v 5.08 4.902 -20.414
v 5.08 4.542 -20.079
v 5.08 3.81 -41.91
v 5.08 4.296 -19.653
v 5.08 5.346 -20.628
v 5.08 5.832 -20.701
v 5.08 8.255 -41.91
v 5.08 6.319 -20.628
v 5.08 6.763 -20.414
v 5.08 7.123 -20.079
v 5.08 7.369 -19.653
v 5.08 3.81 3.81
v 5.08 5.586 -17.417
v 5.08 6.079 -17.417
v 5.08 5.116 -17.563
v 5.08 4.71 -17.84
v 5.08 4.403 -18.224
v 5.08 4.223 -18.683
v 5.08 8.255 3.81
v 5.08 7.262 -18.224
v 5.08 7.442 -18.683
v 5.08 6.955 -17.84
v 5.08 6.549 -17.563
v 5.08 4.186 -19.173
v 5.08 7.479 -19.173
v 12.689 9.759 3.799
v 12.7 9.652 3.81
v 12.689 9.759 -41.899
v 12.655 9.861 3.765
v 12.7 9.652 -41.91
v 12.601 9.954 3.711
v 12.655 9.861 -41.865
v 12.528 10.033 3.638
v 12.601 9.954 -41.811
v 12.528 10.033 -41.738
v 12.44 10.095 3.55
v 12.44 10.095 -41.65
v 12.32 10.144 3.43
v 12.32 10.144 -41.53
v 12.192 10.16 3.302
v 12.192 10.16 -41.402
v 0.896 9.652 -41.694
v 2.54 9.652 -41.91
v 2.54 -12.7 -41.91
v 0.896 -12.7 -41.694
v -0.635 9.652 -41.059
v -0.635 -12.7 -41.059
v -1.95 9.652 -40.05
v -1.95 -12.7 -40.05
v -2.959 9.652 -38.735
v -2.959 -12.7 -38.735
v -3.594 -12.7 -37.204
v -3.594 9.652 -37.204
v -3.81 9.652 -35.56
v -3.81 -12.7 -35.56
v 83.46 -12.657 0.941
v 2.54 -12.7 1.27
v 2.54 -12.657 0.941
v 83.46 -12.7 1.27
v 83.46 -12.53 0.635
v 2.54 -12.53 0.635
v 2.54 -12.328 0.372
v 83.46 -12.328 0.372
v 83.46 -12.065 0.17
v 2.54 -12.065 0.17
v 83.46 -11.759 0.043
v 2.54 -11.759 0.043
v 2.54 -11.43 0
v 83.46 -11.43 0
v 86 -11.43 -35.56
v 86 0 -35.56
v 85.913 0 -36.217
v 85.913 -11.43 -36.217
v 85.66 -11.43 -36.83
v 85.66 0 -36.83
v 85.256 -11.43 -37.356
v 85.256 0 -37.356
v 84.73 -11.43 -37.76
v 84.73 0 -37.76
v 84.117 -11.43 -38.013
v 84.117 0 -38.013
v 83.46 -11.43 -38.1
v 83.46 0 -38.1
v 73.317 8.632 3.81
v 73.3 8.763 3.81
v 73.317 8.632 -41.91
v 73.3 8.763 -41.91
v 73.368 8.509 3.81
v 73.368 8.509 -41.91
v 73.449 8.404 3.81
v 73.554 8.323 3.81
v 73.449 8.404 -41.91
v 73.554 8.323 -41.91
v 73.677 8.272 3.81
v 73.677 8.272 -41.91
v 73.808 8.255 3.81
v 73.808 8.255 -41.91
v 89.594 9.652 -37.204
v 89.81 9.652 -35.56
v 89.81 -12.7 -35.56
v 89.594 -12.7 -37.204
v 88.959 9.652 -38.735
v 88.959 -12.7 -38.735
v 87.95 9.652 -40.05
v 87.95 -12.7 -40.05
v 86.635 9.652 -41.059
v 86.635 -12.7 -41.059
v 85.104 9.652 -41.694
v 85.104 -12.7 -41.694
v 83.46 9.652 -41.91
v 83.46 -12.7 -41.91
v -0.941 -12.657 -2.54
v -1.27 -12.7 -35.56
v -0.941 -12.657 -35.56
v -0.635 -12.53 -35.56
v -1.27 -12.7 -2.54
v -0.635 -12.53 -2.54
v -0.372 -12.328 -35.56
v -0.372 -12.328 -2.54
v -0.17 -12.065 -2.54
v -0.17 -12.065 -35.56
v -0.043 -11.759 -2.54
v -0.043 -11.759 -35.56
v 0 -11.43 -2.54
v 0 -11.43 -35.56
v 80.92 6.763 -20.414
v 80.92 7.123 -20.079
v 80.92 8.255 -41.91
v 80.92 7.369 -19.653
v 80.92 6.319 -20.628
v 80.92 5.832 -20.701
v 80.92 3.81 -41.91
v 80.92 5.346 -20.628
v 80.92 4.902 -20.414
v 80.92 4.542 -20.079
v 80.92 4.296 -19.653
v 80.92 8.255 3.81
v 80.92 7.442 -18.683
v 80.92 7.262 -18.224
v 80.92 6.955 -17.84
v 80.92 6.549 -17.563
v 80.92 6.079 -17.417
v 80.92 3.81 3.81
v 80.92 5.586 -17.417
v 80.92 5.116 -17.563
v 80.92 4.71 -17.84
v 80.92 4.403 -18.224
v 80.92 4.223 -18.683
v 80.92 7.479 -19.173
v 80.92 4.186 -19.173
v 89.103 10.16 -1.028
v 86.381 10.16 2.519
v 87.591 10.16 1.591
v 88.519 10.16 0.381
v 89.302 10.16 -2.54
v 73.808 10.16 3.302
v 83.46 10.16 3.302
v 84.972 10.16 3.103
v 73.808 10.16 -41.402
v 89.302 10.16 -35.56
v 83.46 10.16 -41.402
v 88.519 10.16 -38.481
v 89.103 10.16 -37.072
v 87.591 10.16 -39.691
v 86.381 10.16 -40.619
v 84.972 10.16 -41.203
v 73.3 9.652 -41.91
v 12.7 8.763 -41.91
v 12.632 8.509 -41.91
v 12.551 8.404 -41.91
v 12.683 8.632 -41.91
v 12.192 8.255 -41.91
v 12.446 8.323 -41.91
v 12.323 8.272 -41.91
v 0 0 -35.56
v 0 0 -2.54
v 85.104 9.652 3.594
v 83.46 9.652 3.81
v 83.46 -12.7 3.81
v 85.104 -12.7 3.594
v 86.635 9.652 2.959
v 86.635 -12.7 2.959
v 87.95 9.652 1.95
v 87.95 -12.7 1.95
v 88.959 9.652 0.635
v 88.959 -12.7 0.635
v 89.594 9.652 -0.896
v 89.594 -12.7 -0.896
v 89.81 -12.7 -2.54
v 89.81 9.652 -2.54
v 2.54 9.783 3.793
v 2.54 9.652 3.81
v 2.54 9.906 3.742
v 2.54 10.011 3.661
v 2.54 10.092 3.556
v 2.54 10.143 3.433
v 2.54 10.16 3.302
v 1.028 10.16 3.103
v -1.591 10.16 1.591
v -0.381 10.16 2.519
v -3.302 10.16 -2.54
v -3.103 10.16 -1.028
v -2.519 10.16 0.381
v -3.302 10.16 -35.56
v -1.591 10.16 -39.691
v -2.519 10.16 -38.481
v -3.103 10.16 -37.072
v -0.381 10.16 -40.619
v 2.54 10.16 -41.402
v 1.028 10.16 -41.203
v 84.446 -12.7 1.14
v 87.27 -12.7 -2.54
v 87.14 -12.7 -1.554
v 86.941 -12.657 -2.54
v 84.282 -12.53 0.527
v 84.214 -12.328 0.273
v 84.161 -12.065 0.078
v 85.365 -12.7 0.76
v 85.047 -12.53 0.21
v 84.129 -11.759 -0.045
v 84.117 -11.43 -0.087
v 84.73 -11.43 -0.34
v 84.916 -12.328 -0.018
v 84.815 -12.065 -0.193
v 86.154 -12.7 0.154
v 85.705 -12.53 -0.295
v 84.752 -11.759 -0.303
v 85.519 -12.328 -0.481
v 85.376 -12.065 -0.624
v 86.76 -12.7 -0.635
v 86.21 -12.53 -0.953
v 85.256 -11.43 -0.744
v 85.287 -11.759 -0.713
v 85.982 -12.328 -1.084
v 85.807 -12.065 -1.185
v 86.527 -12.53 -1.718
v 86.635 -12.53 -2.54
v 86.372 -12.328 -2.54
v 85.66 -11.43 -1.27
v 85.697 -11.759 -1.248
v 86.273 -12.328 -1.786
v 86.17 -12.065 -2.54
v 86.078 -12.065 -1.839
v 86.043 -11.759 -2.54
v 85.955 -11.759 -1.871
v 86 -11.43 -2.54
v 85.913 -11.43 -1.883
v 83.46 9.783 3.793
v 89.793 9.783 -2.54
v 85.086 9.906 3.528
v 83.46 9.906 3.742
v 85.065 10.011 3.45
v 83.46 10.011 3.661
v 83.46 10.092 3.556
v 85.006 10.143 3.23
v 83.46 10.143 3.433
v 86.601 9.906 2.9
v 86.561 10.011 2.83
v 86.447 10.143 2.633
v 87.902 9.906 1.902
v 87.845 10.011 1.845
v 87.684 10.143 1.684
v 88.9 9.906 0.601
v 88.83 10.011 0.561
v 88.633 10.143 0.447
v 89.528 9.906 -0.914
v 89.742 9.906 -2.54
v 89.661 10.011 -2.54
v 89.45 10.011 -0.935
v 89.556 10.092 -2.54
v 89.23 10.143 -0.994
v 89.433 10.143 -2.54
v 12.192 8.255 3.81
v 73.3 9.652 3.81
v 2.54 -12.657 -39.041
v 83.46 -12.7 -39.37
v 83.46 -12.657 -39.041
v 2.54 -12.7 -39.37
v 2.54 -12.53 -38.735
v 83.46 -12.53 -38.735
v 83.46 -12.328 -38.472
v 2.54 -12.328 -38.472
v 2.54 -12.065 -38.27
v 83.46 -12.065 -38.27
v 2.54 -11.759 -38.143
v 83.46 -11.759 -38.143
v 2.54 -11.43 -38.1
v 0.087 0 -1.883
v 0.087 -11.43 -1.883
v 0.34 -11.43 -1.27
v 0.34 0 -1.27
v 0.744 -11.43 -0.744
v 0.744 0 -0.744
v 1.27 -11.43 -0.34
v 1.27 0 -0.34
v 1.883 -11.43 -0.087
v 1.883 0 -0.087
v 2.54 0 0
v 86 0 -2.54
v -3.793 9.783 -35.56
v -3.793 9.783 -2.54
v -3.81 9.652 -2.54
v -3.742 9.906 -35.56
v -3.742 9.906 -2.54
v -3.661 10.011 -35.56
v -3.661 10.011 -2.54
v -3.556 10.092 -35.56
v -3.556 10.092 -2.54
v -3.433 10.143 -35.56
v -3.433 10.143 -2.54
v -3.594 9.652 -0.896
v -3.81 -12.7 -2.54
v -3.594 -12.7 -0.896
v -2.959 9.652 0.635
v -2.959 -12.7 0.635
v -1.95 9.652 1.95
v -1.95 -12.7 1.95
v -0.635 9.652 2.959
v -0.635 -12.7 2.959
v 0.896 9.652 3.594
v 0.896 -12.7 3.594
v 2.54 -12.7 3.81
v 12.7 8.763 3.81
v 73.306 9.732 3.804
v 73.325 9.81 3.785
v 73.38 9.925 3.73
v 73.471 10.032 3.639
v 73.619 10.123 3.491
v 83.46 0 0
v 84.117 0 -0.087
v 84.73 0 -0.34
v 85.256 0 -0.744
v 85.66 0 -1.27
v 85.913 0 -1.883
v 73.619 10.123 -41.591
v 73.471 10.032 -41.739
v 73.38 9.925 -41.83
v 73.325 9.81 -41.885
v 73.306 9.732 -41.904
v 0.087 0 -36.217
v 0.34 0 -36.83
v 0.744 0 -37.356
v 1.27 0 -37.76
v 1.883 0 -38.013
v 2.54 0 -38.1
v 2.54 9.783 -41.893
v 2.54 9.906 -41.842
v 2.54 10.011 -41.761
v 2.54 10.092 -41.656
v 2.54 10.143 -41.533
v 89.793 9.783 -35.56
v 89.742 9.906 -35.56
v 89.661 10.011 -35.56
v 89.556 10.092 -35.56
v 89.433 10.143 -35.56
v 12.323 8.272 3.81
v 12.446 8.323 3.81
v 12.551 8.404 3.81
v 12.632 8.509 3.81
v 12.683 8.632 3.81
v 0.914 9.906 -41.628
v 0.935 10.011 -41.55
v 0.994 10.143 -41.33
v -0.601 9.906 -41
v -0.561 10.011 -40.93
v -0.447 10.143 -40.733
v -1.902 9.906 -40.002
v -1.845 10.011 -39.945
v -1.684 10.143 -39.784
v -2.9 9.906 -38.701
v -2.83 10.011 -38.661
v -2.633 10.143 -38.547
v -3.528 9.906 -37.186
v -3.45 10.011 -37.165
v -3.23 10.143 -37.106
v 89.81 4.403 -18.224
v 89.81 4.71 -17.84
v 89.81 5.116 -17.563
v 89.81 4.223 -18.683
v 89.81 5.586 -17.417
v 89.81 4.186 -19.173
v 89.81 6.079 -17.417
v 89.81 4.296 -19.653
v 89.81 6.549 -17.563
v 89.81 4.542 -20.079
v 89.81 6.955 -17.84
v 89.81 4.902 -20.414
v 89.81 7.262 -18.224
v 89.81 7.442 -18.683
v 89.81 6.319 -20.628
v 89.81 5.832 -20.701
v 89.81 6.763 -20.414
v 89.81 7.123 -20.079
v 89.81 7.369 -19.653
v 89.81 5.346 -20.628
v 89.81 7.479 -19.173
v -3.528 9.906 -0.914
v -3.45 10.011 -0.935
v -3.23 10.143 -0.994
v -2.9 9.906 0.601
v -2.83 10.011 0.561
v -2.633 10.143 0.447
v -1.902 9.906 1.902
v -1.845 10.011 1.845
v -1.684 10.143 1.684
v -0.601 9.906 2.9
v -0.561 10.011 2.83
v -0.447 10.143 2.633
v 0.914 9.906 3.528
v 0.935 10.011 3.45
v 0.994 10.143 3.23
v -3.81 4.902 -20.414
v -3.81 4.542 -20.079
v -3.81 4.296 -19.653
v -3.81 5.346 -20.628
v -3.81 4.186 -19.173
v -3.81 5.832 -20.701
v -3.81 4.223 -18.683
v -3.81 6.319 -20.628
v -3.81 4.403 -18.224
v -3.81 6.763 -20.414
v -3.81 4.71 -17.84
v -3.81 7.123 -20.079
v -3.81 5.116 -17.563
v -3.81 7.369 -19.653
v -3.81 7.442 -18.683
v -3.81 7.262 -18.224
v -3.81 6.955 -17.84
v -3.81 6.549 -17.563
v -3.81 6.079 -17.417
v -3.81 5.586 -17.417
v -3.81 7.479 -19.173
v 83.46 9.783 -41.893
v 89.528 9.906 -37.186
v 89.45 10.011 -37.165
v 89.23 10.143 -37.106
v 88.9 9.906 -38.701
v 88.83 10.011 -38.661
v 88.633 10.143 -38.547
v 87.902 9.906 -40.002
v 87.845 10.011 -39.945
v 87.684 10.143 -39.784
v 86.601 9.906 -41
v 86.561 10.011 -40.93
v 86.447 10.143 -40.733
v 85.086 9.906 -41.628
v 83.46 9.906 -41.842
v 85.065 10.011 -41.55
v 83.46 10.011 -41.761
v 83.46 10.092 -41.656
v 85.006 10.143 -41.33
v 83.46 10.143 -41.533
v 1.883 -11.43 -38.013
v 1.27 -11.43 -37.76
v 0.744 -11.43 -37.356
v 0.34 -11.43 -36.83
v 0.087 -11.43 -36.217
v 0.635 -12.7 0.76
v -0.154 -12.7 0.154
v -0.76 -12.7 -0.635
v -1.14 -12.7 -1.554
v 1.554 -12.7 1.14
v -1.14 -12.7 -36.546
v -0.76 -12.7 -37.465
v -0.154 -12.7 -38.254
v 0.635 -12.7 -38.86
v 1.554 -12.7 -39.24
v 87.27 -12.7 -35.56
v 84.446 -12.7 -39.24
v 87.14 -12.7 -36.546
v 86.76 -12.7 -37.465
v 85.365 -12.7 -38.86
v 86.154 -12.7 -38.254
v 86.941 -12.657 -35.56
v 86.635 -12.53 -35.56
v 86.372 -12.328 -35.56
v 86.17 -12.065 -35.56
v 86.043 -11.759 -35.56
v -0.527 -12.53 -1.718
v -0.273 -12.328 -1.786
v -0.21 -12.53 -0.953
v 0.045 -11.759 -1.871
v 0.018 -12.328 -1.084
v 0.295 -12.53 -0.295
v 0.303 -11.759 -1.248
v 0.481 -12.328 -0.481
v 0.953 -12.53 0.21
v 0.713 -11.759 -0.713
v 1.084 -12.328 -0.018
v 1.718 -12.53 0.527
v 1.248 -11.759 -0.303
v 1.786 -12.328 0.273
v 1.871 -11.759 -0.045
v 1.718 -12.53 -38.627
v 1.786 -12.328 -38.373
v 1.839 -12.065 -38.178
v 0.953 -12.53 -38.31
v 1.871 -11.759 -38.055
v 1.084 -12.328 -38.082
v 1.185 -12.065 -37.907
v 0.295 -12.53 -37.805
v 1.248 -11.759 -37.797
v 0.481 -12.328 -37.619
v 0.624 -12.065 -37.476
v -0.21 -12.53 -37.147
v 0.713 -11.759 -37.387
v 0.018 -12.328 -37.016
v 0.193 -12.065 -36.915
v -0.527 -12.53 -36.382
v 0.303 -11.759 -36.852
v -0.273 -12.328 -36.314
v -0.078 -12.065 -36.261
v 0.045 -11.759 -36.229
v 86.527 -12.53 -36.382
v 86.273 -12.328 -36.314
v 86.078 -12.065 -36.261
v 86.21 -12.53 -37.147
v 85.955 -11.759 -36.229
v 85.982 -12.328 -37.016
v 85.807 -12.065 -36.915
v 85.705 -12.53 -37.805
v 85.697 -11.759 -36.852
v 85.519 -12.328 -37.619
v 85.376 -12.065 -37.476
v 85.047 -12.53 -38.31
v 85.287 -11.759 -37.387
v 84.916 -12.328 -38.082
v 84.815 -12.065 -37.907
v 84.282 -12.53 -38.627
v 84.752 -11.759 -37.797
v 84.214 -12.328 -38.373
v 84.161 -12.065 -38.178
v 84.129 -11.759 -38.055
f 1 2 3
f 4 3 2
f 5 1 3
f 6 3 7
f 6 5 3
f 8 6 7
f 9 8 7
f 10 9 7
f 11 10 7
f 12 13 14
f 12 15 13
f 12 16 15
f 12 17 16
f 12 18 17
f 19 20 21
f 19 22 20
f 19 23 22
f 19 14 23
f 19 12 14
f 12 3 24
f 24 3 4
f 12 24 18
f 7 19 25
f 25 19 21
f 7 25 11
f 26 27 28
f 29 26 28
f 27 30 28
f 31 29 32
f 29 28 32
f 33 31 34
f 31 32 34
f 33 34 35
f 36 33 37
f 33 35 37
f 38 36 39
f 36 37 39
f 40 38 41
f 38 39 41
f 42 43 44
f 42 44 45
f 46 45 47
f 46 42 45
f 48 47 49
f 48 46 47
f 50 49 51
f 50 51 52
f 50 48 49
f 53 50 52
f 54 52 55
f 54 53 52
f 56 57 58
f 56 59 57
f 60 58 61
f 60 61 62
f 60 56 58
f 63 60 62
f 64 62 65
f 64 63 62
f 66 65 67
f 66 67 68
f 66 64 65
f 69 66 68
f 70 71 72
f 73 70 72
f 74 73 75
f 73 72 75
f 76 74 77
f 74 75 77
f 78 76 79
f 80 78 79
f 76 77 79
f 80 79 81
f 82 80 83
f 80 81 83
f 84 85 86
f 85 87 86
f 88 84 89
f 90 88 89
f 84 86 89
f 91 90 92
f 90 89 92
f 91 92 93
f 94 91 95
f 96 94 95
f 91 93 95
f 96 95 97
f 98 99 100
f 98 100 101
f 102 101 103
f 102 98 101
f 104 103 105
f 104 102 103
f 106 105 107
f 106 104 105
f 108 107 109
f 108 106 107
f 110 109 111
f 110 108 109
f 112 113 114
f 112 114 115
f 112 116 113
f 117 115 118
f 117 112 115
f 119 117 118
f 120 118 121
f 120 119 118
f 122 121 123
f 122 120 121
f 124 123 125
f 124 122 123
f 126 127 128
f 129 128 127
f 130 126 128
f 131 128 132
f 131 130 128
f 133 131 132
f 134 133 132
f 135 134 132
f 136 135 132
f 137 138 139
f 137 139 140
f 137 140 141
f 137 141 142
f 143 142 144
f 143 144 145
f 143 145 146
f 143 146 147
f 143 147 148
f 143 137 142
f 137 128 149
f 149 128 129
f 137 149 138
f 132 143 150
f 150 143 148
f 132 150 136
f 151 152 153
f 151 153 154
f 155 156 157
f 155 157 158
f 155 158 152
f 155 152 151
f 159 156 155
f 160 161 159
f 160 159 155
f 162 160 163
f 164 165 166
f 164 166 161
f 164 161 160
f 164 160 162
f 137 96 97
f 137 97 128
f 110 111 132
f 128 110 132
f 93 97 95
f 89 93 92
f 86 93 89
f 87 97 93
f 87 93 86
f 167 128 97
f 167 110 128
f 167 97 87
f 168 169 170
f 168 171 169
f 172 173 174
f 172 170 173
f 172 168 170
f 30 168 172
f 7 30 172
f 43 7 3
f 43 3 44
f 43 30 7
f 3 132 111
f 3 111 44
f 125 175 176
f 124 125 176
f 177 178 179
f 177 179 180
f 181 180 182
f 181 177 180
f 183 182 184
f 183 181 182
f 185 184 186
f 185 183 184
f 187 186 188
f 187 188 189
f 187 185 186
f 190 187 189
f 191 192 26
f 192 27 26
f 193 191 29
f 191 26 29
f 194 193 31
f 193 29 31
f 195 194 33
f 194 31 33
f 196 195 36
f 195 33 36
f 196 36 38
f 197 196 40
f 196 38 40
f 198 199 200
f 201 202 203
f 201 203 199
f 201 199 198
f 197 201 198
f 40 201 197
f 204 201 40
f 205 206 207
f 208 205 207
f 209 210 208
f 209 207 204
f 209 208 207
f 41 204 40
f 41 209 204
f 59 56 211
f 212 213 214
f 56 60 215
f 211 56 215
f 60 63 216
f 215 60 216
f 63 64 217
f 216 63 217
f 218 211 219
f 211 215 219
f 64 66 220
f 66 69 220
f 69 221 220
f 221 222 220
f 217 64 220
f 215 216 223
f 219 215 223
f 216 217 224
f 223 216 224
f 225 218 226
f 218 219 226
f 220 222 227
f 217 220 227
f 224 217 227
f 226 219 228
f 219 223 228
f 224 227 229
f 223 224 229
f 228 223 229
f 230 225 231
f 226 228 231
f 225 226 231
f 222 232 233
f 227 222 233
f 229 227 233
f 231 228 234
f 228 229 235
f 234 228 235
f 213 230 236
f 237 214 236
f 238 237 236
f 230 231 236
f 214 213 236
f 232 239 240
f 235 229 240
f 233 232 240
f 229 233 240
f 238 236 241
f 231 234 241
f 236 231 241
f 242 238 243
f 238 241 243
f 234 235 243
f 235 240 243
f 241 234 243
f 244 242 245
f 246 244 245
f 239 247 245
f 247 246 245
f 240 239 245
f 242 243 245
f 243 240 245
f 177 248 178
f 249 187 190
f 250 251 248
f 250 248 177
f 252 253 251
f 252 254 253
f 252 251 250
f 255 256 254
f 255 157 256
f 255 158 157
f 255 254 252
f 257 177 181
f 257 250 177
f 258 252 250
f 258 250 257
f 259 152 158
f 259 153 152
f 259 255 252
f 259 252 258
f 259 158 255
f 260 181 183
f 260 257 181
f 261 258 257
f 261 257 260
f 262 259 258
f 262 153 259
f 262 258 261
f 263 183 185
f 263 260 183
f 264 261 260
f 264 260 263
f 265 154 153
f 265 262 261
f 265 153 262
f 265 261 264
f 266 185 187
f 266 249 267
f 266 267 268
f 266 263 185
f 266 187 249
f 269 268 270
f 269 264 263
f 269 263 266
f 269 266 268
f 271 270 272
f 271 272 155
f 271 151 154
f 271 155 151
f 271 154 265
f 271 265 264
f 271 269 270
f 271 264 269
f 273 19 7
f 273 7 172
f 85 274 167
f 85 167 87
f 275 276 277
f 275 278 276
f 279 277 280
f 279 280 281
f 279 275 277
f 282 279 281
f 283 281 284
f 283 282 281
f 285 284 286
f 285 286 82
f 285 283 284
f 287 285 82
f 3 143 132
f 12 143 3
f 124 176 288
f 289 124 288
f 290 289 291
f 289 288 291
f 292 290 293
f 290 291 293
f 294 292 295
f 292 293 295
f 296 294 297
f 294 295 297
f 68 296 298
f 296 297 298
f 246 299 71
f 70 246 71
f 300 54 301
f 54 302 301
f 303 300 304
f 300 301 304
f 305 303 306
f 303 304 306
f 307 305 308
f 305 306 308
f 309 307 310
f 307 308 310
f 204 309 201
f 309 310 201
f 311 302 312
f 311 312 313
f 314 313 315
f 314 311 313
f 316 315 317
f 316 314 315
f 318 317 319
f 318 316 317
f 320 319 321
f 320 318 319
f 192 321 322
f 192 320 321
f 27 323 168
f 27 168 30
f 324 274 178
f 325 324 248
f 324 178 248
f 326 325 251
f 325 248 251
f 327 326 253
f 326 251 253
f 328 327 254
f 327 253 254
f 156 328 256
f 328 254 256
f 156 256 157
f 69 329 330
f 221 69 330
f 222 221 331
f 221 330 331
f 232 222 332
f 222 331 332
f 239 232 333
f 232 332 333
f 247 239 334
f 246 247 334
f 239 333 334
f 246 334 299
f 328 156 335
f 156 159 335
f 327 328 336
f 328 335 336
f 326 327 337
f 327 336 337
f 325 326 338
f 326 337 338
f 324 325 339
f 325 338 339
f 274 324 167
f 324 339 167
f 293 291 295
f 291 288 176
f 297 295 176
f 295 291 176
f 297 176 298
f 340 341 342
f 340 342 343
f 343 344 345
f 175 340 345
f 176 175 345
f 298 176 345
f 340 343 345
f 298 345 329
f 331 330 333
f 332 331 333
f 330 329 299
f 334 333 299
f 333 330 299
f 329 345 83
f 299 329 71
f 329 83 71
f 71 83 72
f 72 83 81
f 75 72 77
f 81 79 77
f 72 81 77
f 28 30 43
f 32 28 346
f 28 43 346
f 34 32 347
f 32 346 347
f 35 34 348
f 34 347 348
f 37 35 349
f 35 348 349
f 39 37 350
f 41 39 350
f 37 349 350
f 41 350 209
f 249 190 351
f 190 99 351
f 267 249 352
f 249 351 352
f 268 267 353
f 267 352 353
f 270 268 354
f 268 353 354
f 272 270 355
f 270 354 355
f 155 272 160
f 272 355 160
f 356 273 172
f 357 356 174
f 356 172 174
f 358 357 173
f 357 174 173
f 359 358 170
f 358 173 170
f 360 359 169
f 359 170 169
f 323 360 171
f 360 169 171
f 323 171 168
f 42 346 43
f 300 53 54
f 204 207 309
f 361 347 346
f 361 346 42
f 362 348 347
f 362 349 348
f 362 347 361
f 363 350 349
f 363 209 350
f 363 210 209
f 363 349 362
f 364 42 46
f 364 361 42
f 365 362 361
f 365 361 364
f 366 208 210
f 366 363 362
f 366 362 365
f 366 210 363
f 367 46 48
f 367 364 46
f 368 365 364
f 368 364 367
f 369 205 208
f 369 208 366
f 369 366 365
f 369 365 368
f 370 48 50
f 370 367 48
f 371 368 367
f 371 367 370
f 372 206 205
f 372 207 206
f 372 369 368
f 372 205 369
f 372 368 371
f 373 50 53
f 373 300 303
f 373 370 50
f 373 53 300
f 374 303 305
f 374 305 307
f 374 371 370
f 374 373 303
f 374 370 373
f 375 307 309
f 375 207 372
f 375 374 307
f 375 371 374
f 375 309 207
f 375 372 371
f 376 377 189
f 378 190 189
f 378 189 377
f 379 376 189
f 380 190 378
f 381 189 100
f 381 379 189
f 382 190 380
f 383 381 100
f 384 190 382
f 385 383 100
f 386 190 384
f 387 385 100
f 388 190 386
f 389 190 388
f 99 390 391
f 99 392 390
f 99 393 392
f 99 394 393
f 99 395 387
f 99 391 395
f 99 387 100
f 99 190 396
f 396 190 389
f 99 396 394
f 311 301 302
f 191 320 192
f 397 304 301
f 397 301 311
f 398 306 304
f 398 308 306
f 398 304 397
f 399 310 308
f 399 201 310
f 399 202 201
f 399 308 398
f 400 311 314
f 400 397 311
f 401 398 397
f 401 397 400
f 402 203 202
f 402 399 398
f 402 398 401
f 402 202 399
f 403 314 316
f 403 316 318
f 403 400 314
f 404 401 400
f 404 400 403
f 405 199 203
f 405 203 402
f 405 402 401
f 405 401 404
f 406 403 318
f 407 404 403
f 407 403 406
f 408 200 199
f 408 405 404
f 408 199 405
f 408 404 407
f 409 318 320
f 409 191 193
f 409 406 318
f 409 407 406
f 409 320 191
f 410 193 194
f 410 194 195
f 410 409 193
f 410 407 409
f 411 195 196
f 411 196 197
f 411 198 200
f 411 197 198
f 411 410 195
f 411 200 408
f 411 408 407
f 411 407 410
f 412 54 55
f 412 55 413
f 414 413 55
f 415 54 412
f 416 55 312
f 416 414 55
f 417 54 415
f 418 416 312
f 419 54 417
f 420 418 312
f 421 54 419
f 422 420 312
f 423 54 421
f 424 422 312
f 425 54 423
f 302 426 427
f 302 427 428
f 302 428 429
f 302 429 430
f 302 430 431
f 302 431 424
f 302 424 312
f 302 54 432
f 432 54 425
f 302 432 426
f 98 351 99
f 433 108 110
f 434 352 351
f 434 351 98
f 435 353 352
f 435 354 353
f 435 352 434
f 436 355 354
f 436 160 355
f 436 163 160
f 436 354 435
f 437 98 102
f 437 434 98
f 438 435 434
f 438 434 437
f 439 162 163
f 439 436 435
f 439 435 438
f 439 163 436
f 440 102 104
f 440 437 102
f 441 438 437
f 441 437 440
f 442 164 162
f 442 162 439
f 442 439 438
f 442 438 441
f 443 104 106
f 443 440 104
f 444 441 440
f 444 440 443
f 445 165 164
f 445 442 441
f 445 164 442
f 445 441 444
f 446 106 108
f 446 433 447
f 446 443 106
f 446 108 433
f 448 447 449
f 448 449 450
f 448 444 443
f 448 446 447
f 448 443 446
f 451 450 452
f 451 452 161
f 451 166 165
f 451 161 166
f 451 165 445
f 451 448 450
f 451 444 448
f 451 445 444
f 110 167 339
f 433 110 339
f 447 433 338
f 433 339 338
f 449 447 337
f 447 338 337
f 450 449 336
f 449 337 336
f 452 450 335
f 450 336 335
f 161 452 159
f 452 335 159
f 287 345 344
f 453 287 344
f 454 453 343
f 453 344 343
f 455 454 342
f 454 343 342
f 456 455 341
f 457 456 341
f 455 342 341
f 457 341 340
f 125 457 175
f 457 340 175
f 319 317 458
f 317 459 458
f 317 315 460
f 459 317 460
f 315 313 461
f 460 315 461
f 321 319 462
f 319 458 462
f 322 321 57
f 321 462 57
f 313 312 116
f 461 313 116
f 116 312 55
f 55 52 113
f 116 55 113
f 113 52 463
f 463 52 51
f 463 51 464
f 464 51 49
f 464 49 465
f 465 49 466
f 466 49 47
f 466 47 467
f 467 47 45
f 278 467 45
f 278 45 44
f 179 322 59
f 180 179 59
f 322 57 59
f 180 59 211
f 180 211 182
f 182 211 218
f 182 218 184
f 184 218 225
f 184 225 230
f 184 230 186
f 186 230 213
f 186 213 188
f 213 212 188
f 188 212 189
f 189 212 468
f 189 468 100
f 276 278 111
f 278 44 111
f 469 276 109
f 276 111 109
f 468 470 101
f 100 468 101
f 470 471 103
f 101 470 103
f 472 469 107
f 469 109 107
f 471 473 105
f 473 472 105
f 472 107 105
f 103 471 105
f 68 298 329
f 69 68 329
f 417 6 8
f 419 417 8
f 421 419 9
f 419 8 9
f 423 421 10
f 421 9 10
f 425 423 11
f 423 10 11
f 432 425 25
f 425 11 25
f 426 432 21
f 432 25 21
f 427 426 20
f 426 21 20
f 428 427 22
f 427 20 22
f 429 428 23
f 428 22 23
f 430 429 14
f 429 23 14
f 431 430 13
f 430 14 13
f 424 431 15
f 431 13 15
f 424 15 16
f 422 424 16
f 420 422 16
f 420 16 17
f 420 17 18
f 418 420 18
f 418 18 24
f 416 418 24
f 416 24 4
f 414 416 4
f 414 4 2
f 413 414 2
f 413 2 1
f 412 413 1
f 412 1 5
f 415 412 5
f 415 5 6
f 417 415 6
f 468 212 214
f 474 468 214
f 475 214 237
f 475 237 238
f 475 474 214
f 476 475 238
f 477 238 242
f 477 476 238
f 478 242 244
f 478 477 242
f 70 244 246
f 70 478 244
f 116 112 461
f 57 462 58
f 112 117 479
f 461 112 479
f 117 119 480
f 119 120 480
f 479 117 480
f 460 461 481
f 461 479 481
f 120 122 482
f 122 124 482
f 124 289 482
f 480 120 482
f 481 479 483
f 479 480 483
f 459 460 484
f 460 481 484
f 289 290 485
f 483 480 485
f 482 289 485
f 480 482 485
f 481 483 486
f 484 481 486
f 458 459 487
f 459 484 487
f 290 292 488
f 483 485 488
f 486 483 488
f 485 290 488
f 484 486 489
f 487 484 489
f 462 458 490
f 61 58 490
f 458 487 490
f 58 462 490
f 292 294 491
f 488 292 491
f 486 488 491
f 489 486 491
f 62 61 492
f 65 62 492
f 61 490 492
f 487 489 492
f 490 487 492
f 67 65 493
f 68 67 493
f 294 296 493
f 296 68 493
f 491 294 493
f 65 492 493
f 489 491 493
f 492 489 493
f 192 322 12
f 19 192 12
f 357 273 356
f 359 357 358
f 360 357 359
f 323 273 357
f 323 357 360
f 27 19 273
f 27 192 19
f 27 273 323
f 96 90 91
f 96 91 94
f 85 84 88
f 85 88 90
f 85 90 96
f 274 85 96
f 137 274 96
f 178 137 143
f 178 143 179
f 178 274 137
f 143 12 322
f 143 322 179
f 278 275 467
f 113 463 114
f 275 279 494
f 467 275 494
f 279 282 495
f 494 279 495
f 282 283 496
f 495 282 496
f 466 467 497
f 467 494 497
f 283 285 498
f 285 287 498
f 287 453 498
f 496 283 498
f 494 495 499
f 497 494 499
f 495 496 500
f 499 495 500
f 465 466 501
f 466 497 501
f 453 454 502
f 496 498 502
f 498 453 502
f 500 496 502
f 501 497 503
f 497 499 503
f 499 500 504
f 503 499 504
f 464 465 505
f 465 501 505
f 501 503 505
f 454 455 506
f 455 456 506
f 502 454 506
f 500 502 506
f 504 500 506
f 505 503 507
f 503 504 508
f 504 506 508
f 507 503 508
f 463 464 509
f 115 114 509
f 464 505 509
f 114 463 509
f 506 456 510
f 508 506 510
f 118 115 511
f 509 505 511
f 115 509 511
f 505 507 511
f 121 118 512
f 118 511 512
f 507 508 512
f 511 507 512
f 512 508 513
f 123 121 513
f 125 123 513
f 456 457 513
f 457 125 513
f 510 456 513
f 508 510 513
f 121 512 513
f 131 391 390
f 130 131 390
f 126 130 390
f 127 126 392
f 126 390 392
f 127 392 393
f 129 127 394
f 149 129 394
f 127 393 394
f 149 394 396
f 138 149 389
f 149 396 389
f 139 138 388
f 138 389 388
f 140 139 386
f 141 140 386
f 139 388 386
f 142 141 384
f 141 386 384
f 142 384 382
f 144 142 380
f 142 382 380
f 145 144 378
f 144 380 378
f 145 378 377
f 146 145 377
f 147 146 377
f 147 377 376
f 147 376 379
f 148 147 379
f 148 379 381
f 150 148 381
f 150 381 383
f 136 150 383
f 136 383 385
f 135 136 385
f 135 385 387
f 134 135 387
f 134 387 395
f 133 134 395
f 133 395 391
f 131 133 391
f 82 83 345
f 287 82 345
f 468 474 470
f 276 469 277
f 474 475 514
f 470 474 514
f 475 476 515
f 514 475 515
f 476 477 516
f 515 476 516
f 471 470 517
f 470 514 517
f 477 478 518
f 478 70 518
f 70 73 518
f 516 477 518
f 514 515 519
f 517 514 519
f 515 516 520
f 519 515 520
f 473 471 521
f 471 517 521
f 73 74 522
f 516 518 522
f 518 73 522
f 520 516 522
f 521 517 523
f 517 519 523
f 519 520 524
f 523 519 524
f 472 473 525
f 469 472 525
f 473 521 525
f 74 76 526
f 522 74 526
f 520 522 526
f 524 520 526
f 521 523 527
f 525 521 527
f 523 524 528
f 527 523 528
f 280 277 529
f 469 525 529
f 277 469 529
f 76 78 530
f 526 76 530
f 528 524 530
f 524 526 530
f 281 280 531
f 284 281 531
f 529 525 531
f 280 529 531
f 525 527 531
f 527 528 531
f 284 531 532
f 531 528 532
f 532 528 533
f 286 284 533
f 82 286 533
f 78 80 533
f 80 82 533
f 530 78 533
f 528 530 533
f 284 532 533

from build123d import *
from OCP.BRepFilletAPI import BRepFilletAPI_MakeFillet

# Parameters (mm, degrees)
BOSS_EXTRUDE1_DEPTH = 12.7
BOSS_EXTRUDE2_START = 10.16
BOSS_EXTRUDE2_DEPTH = 10.16
CUT_EXTRUDE1_REACH  = 103.575
SKETCH5_R           = 1.651
CUT_EXTRUDE2_DEPTH  = 104.355902105
FILLET1_R1          = 0.508
FILLET1_R2          = 1.27


with BuildPart() as part:
    # Sketch1 → Boss-Extrude1 (new body)
    with BuildSketch(Plane(origin=(0, 0, 0), x_dir=(1, 0, 0), z_dir=(0, 1, 0))):
        with BuildLine():
            Line((2.54, -3.81), (83.46, -3.81))
            ThreePointArc((83.46, -3.81), (87.950128061, -1.950128061), (89.81, 2.54))
            Line((89.81, 2.54), (89.81, 35.56))
            ThreePointArc((89.81, 35.56), (87.950128061, 40.050128061), (83.46, 41.91))
            Line((83.46, 41.91), (2.54, 41.91))
            ThreePointArc((2.54, 41.91), (-1.950128061, 40.050128061), (-3.81, 35.56))
            Line((-3.81, 35.56), (-3.81, 2.54))
            ThreePointArc((-3.81, 2.54), (-1.950128061, -1.950128061), (2.54, -3.81))
        make_face()
        with BuildLine():
            Line((2.54, 0), (83.46, 0))
            ThreePointArc((83.46, 0), (85.256051224, 0.743948776), (86, 2.54))
            Line((86, 2.54), (86, 35.56))
            ThreePointArc((86, 35.56), (85.256051224, 37.356051224), (83.46, 38.1))
            Line((83.46, 38.1), (2.54, 38.1))
            ThreePointArc((2.54, 38.1), (0.743948776, 37.356051224), (0, 35.56))
            Line((0, 35.56), (0, 2.54))
            ThreePointArc((0, 2.54), (0.743948776, 0.743948776), (2.54, 0))
        make_face(mode=Mode.SUBTRACT)
    extrude(amount=-BOSS_EXTRUDE1_DEPTH)

    # Sketch3 → Boss-Extrude2 (add)
    with BuildSketch(Plane(origin=(0, 0, 0), x_dir=(1, 0, 0), z_dir=(0, 1, 0)).offset(BOSS_EXTRUDE2_START)):
        with BuildLine():
            Line((83.46, 41.91), (2.54, 41.91))
            ThreePointArc((2.54, 41.91), (-1.950128061, 40.050128061), (-3.81, 35.56))
            Line((-3.81, 35.56), (-3.81, 2.54))
            ThreePointArc((-3.81, 2.54), (-1.950128061, -1.950128061), (2.54, -3.81))
            Line((2.54, -3.81), (83.46, -3.81))
            ThreePointArc((83.46, -3.81), (87.950128061, -1.950128061), (89.81, 2.54))
            Line((89.81, 2.54), (89.81, 35.56))
            ThreePointArc((89.81, 35.56), (87.950128061, 40.050128061), (83.46, 41.91))
        make_face()
    extrude(amount=-BOSS_EXTRUDE2_DEPTH)

    # Sketch4 → Cut-Extrude1 (cut, up to next)
    with BuildSketch(Plane.XY.offset(3.81), mode=Mode.PRIVATE) as cut_extrude1_sk1:
        Polygon((73.3, 10.16), (73.3, 8.255), (80.92, 8.255), (80.92, 3.81), (5.08, 3.81), (5.08, 8.255), (12.7, 8.255), (12.7, 10.16), align=None)
    cut_extrude1_tool1 = extrude(cut_extrude1_sk1.sketch, amount=-CUT_EXTRUDE1_REACH, mode=Mode.PRIVATE) & part.part
    add(cut_extrude1_tool1.solids().sort_by_distance((43, 6.842422, 3.81))[0], mode=Mode.SUBTRACT)

    # Sketch5 → Cut-Extrude2 (cut, through all)
    with BuildSketch(Plane(origin=(89.81, 0, 0), x_dir=(0, 0, -1), z_dir=(1, 0, 0))):
        with Locations((19.05, 5.8325)):
            Circle(SKETCH5_R)
    extrude(amount=-CUT_EXTRUDE2_DEPTH, mode=Mode.SUBTRACT)

    # Fillet1: one fillet with a radius per group of edges: ONE call of the kernel's fillet builder (fillet() takes one radius for all edges)
    fillet1_edges_1 = [part.edges().sort_by_distance(p)[0] for p in [
        (12.7, 8.255, -19.05),
        (73.3, 8.255, -19.05),
        (12.7, 10.16, -19.05),
        (73.3, 10.16, -19.05),
        (7.62, 10.16, -41.91),
        (78.38, 10.16, -41.91),
    ]]
    fillet1_edges_2 = [part.edges().sort_by_distance(p)[0] for p in [
        (43, -12.7, 0),
    ]]
    fillet1 = BRepFilletAPI_MakeFillet(part.part.solid().wrapped)
    for e in fillet1_edges_1:
        fillet1.Add(FILLET1_R1, e.wrapped)
    for e in fillet1_edges_2:
        fillet1.Add(FILLET1_R2, e.wrapped)
    add(Compound.cast(fillet1.Shape()), mode=Mode.REPLACE)


solid = part.part
